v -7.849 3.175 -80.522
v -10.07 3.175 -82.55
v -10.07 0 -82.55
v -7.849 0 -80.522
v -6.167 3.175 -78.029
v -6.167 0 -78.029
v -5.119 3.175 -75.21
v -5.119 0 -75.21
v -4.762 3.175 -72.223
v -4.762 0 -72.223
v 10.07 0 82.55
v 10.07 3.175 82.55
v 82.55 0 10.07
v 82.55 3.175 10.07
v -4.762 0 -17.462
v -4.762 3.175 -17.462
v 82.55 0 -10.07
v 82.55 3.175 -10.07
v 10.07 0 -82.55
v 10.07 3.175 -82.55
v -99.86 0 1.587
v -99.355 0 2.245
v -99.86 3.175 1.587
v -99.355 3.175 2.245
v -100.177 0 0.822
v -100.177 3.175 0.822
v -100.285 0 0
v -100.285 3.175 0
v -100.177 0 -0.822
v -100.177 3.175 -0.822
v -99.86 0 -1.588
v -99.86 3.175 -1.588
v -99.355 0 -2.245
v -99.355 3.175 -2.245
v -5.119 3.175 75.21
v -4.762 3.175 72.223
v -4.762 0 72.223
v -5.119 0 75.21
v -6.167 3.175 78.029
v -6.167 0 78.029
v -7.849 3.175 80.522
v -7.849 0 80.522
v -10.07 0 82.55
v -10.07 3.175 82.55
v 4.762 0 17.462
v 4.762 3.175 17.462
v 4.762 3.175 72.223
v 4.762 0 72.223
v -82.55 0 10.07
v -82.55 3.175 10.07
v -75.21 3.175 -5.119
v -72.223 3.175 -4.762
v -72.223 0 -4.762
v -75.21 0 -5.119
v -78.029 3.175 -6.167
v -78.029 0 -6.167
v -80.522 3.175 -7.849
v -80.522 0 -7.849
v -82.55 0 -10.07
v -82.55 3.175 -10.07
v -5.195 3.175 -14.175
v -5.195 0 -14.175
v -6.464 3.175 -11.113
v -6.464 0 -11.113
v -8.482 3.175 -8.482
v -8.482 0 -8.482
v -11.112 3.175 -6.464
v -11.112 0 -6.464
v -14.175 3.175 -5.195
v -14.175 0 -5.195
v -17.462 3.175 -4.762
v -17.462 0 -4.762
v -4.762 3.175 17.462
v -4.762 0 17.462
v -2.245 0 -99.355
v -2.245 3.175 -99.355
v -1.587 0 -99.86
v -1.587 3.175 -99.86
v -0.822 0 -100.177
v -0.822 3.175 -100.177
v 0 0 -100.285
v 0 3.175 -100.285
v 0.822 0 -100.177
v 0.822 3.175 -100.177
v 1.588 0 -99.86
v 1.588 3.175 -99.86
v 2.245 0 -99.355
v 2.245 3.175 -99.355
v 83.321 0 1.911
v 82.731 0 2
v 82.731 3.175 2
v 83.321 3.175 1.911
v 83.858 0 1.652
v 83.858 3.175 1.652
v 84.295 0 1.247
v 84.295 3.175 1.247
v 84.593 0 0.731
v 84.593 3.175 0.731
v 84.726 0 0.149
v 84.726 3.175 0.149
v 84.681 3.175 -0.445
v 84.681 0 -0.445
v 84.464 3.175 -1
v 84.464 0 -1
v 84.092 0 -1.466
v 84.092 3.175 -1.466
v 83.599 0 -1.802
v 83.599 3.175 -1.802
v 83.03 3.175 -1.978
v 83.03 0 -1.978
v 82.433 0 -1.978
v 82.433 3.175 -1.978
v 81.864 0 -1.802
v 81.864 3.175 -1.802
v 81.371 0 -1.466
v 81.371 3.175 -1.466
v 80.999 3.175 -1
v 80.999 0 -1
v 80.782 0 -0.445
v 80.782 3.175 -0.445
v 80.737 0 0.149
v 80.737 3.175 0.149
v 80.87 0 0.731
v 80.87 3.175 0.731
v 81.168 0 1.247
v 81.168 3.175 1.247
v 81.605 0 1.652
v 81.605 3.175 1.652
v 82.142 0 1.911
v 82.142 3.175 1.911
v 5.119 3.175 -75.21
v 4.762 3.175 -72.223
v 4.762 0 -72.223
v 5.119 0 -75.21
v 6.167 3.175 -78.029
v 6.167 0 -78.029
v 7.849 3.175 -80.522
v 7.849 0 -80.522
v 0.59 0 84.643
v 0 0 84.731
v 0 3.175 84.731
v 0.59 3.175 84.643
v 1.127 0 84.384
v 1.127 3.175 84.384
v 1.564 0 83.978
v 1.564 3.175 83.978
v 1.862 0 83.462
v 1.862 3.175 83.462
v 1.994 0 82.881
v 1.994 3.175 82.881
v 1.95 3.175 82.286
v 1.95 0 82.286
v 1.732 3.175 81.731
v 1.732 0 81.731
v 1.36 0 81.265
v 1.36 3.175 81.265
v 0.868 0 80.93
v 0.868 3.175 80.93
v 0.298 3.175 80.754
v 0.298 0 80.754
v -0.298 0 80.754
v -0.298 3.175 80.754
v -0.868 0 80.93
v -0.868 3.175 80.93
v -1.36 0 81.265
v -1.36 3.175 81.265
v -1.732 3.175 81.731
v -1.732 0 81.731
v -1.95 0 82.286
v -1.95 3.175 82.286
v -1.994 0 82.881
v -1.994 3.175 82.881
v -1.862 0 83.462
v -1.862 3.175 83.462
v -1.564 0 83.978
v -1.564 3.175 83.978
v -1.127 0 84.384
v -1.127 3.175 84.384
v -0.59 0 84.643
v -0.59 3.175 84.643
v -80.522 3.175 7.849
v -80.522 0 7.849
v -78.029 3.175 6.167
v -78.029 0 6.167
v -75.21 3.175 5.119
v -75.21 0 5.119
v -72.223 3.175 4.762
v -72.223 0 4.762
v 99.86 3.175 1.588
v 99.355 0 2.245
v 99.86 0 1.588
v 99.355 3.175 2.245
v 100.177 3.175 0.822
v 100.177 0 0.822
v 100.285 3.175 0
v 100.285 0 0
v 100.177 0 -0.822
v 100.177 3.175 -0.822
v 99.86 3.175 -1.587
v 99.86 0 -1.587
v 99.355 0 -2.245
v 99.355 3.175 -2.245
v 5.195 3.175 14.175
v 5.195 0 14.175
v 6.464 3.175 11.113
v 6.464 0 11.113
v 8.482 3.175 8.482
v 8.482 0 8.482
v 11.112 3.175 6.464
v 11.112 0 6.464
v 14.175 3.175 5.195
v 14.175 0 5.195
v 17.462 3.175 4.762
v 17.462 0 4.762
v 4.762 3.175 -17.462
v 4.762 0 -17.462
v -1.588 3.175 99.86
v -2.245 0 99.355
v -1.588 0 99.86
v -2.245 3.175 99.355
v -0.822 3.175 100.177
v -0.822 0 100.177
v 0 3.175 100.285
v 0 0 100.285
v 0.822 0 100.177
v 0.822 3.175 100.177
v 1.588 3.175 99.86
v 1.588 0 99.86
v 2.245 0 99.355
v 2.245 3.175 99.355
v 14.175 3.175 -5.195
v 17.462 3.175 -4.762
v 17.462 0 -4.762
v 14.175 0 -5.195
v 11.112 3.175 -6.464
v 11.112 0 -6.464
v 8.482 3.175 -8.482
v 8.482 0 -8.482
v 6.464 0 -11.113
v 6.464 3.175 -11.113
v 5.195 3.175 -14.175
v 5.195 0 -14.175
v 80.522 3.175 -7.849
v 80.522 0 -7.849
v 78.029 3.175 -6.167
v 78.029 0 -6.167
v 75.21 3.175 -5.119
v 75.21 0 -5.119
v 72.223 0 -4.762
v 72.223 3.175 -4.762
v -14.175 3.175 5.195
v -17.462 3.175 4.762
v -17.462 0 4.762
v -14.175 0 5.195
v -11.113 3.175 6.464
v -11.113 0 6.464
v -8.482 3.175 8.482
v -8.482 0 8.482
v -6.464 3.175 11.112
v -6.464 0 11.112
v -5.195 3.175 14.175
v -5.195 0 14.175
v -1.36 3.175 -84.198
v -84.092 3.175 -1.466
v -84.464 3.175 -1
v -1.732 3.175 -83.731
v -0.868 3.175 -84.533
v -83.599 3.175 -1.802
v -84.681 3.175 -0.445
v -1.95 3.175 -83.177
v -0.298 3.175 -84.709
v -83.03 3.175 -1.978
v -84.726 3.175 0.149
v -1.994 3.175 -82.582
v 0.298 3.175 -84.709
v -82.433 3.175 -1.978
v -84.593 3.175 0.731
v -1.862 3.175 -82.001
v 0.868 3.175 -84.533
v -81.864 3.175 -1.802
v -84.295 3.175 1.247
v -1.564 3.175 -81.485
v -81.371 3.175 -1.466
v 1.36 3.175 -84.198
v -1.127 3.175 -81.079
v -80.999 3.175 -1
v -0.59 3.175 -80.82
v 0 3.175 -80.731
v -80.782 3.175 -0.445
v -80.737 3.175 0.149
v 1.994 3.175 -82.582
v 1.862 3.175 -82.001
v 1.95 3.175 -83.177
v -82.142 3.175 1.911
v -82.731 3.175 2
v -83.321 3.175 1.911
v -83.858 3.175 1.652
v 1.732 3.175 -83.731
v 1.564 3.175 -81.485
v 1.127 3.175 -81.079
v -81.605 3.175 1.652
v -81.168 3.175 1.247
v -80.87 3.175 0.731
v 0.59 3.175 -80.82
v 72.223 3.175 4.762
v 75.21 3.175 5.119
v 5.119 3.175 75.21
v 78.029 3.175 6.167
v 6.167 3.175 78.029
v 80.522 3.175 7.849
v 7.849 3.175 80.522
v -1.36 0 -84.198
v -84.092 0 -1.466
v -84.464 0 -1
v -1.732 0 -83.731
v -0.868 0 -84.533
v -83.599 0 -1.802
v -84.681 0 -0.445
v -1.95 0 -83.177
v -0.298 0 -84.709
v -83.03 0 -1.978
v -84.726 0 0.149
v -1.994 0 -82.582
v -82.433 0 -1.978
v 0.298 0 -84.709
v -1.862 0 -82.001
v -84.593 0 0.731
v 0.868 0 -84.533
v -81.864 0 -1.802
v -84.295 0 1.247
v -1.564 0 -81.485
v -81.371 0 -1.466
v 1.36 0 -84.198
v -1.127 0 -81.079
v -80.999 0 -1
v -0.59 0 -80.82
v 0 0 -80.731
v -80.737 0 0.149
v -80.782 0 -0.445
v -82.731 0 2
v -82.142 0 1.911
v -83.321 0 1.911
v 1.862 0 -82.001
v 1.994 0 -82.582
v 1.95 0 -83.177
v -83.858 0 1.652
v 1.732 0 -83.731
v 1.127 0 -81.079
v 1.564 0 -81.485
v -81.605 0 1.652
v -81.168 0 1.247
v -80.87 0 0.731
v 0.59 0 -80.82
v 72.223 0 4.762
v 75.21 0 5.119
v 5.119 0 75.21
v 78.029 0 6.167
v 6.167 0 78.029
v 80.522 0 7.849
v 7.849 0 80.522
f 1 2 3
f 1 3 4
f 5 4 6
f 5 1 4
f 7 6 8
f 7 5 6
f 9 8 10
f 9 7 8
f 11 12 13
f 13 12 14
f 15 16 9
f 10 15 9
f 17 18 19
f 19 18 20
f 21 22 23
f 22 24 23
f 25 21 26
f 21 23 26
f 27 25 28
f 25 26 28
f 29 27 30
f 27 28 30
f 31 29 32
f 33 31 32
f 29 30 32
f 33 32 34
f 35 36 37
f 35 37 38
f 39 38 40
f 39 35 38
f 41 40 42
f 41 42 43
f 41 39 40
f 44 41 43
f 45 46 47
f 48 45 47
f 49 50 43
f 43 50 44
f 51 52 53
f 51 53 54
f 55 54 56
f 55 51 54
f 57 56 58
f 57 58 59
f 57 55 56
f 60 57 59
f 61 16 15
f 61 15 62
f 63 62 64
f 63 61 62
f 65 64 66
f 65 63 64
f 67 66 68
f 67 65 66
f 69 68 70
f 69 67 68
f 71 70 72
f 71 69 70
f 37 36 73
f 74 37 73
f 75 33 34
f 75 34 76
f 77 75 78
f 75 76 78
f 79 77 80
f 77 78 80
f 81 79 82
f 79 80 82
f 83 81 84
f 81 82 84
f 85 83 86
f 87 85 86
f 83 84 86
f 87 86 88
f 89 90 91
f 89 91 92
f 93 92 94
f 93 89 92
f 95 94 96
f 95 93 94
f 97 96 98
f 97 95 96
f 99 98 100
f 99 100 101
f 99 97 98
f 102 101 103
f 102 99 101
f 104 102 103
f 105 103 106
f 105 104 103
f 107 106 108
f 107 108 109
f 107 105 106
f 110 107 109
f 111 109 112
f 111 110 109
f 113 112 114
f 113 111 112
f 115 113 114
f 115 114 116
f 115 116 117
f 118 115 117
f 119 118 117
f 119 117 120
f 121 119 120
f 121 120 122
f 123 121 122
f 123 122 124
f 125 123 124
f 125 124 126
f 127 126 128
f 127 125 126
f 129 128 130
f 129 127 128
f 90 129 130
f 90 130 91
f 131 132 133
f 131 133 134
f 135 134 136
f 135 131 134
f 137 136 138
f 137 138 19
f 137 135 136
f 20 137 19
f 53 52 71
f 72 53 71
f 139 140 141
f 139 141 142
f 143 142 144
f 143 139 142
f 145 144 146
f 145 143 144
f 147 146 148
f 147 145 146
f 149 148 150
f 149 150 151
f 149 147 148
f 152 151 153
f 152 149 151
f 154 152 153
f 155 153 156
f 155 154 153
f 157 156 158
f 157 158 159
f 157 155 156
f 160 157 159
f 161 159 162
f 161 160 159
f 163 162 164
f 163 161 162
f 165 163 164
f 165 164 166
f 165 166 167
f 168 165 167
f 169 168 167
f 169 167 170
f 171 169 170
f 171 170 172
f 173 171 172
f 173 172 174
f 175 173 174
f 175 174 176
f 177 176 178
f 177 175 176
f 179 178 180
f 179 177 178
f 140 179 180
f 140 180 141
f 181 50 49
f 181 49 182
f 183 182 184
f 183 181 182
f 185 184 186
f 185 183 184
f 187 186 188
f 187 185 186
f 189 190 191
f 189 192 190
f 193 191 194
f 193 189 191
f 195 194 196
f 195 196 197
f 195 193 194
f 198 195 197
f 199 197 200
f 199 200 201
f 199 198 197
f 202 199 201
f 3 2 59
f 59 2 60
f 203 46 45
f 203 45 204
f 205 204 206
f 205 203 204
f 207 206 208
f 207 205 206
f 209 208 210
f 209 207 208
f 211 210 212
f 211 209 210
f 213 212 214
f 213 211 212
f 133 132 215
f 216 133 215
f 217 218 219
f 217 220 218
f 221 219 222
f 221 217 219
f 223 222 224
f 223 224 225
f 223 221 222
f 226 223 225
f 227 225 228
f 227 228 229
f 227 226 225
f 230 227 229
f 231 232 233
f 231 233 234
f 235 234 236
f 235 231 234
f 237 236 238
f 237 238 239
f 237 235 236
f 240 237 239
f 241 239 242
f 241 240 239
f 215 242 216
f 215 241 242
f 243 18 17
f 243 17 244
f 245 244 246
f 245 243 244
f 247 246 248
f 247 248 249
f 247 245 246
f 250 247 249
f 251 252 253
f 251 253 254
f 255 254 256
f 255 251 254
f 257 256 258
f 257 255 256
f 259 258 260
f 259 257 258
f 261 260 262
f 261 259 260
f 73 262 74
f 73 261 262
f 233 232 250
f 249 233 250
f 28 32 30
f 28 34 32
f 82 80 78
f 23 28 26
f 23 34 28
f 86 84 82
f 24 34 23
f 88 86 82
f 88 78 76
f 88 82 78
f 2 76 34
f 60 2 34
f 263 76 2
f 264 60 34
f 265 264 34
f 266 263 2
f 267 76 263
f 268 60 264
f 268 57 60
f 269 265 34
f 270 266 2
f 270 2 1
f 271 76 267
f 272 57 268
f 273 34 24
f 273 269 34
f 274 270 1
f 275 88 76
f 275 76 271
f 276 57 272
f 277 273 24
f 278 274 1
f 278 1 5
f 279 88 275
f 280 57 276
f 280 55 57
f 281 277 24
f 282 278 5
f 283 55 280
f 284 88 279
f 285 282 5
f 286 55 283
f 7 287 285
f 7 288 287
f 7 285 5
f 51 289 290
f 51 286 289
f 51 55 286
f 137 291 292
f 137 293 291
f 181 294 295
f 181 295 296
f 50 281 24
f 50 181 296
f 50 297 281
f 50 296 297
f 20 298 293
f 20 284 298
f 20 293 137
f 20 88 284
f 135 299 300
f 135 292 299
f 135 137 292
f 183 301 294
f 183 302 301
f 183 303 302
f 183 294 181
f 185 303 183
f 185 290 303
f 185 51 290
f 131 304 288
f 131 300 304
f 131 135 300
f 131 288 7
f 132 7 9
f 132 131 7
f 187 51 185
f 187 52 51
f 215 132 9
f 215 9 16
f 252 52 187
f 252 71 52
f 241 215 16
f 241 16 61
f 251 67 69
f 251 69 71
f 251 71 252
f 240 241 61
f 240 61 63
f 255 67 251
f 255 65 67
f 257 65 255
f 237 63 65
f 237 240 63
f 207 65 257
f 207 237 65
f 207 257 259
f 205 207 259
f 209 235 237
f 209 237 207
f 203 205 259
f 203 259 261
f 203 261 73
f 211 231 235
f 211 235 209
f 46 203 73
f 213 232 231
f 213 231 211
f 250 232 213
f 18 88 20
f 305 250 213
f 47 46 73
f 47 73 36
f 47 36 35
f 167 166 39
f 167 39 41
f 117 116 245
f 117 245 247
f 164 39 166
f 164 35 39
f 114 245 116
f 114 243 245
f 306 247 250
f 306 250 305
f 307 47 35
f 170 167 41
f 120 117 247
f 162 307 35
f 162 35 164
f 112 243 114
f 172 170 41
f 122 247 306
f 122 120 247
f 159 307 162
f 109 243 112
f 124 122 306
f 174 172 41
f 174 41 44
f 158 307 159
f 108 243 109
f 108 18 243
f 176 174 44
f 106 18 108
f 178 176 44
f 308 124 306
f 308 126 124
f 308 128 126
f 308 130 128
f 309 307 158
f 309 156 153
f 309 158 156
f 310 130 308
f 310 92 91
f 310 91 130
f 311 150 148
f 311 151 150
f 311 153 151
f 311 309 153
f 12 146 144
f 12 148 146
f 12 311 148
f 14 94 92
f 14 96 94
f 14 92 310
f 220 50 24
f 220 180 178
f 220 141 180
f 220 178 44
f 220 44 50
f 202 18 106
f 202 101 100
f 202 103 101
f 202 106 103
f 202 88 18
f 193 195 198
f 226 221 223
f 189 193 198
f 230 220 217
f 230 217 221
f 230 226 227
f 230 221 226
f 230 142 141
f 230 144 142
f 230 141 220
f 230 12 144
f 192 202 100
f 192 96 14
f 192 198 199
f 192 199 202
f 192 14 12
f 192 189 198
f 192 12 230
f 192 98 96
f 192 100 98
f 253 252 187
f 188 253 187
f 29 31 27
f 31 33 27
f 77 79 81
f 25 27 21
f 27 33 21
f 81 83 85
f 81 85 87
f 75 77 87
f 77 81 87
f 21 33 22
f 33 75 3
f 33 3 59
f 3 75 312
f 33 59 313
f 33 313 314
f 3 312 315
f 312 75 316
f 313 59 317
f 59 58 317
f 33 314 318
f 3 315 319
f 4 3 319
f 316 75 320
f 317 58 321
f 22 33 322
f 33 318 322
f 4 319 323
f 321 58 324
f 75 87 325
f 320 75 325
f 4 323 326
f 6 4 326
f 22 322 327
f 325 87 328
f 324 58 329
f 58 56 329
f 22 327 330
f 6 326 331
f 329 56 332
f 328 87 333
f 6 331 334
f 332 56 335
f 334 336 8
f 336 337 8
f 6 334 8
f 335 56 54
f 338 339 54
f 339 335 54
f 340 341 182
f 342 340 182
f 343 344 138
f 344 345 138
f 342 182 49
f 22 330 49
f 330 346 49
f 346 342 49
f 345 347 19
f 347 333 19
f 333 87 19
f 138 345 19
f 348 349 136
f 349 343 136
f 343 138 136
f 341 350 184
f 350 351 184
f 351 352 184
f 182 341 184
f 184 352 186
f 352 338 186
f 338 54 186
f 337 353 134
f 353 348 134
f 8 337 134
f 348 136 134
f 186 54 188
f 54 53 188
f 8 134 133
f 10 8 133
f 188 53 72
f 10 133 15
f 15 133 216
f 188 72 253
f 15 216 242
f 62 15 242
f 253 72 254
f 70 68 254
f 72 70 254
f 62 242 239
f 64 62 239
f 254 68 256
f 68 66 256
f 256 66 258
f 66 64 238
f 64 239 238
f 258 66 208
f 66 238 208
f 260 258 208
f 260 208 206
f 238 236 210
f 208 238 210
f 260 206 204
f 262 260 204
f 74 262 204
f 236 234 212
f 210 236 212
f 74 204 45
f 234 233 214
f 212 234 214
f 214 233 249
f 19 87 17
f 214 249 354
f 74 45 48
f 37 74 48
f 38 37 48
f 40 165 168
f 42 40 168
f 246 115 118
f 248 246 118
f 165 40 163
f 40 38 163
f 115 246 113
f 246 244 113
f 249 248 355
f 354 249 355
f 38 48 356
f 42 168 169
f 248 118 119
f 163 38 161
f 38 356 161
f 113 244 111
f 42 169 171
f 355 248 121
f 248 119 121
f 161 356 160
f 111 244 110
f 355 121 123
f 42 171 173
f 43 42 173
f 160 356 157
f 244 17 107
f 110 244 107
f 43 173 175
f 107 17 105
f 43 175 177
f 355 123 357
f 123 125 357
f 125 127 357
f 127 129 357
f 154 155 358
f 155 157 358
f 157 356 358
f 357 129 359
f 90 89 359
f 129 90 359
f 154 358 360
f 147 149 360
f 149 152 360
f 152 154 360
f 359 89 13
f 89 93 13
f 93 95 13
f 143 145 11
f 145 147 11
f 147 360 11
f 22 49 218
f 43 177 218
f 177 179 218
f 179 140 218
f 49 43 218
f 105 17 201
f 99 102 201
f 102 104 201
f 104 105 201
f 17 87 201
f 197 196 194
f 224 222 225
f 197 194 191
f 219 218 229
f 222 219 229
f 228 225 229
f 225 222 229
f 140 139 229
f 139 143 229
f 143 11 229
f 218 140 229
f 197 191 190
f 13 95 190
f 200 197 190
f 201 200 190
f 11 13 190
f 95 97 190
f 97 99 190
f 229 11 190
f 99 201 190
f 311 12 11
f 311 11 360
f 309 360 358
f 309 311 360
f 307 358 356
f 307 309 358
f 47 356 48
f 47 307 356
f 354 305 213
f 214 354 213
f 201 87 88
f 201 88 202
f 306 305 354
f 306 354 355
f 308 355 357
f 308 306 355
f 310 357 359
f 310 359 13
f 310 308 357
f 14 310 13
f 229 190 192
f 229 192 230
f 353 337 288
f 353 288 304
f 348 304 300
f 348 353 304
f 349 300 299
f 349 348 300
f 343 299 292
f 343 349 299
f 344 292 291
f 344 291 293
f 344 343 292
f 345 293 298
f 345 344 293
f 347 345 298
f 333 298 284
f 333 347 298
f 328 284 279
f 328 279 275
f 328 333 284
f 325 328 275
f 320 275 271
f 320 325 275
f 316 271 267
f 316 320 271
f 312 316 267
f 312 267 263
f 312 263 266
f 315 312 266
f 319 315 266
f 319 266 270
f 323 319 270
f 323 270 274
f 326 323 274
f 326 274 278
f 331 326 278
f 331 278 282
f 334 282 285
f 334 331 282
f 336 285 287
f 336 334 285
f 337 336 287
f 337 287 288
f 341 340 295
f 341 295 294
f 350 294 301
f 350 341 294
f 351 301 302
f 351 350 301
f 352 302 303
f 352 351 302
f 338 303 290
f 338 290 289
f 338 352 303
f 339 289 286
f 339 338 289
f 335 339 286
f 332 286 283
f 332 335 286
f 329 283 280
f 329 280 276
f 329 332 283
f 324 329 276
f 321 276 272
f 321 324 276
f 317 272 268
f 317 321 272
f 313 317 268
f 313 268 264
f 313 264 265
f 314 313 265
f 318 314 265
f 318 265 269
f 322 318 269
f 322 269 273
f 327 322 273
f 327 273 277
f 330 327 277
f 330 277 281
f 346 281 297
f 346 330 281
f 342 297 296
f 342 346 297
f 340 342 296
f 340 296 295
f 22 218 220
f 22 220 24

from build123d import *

# Parameters (mm, degrees)
SKETCH1_R           = 2
BOSS_EXTRUDE1_DEPTH = 3.175
CUT_EXTRUDE1_DEPTH  = 144.719172782
FILLET1_R           = 12.7
FILLET2_R           = 3.175


with BuildPart() as part:
    # Sketch1 → Boss-Extrude1 (new body)
    with BuildSketch(Plane(origin=(0, 0, 0), x_dir=(1, 0, 0), z_dir=(0, 1, 0))):
        Polygon((0, -101.6), (-101.6, 0), (0, 101.6), (101.6, 0), align=None)
        with Locations(Location((0, 82.731493173, 0), (0, 0, 270))):
            Circle(SKETCH1_R, mode=Mode.SUBTRACT)
        with Locations(Location((-82.731493173, 0, 0), (0, 0, 270))):
            Circle(SKETCH1_R, mode=Mode.SUBTRACT)
        with Locations(Location((0, -82.731493173, 0), (0, 0, 270))):
            Circle(SKETCH1_R, mode=Mode.SUBTRACT)
        with Locations(Location((82.731493173, 0, 0), (0, 0, 270))):
            Circle(SKETCH1_R, mode=Mode.SUBTRACT)
    extrude(amount=BOSS_EXTRUDE1_DEPTH)

    # Sketch2 → Cut-Extrude1 (cut, through all)
    with BuildSketch(Plane(origin=(0, 3.175, 0), x_dir=(1, 0, 0), z_dir=(0, 1, 0))):
        Polygon((-4.7625, -4.7625), (-82.55, -4.7625), (-82.55, -10.069743879), (-10.069743879, -82.55), (-4.7625, -82.55), align=None)
        Polygon((-4.7625, 4.7625), (-4.7625, 82.55), (-10.069743879, 82.55), (-82.55, 10.069743879), (-82.55, 4.7625), align=None)
        Polygon((4.7625, 82.55), (4.7625, 4.7625), (82.55, 4.7625), (82.55, 10.069743879), (10.069743879, 82.55), align=None)
        Polygon((4.7625, -4.7625), (4.7625, -82.55), (10.069743879, -82.55), (82.55, -10.069743879), (82.55, -4.7625), align=None)
    extrude(amount=-CUT_EXTRUDE1_DEPTH, mode=Mode.SUBTRACT)

    # Fillet1
    # the kernel refuses this fillet: 12.7 mm, written as the material it adds along each edge
    with BuildSketch(Plane(origin=(4.7625, 3.175, 82.55), x_dir=(0, 0, -1), z_dir=(0, -1, 0)), Plane(origin=(-82.55, 3.175, 4.7625), x_dir=(1, 0, 0), z_dir=(0, -1, 0)), Plane(origin=(-4.7625, 3.175, -82.55), x_dir=(0, 0, 1), z_dir=(0, -1, 0))) as fillet1_piece_1:
        with BuildLine():
            CenterArc((10.326526857, 12.7), FILLET1_R, 215.59885924, 54.40114076)
            Line((0, 5.307243879), (-0.206530537, 5.159388757))
            ThreePointArc((-0.206530537, 5.159388757), (-0.254, 2.653621939), (-0.254, 0))
            Line((-0.254, 0), (0, -0.254))
            Line((0, -0.254), (10.326526857, -0.254))
            Line((10.326526857, -0.254), (10.326526857, 0))
        make_face()
    extrude(amount=3.175)
    with BuildSketch(Plane(origin=(4.7625, 3.175, 4.7625), x_dir=(0, 0, 1), z_dir=(0, -1, 0)), Plane(origin=(-4.7625, 3.175, -4.7625), x_dir=(0, 0, -1), z_dir=(0, -1, 0)), Plane(origin=(-4.7625, 3.175, 4.7625), x_dir=(-1, 0, 0), z_dir=(0, -1, 0))) as fillet1_piece_2:
        with BuildLine():
            CenterArc((FILLET1_R, -FILLET1_R), FILLET1_R, 90, 90)
            Line((0, -FILLET1_R), (-FILLET1_R * 0.02, -FILLET1_R))
            Line((-FILLET1_R * 0.02, -FILLET1_R), (-FILLET1_R * 0.02, FILLET1_R * 0.02))
            Line((-FILLET1_R * 0.02, FILLET1_R * 0.02), (FILLET1_R, FILLET1_R * 0.02))
            Line((FILLET1_R, FILLET1_R * 0.02), (FILLET1_R, 0))
        make_face()
    extrude(amount=3.175)
    with BuildSketch(Plane(origin=(82.55, 3.175, 4.7625), x_dir=(-1, 0, 0), z_dir=(0, -1, 0)), Plane(origin=(-4.7625, 3.175, 82.55), x_dir=(0, 0, -1), z_dir=(0, -1, 0)), Plane(origin=(-82.55, 3.175, -4.7625), x_dir=(1, 0, 0), z_dir=(0, -1, 0)), Plane(origin=(4.7625, 3.175, -82.55), x_dir=(0, 0, 1), z_dir=(0, -1, 0))) as fillet1_piece_3:
        with BuildLine():
            CenterArc((10.326526857, -12.7), FILLET1_R, 90, 54.40114076)
            Line((0, -5.307243879), (-0.206530537, -5.159388757))
            ThreePointArc((-0.206530537, -5.159388757), (-0.254, -2.653621939), (-0.254, 0))
            Line((-0.254, 0), (0, 0.254))
            Line((0, 0.254), (10.326526857, 0.254))
            Line((10.326526857, 0.254), (10.326526857, 0))
        make_face()
    extrude(amount=3.175)
    with BuildSketch(Plane(origin=(82.55, 3.175, -4.7625), x_dir=(0, 0, -1), z_dir=(0, -1, 0))) as fillet1_piece_4:
        with BuildLine():
            CenterArc((12.7, -10.326526857), FILLET1_R, 125.59885924, 54.40114076)
            Line((0, -10.326526857), (-0.254, -10.326526857))
            Line((-0.254, -10.326526857), (-0.254, 0))
            Line((-0.254, 0), (0, 0.254))
            ThreePointArc((0, 0.254), (2.653621939, 0.254), (5.159388757, 0.206530537))
            Line((5.159388757, 0.206530537), (5.307243879, 0))
        make_face()
    extrude(amount=3.175)
    with BuildSketch(Plane(origin=(4.7625, 3.175, -4.7625), x_dir=(0, 0, -1), z_dir=(0, -1, 0))) as fillet1_piece_5:
        with BuildLine():
            CenterArc((FILLET1_R, FILLET1_R), FILLET1_R, 180, 90)
            Line((0, FILLET1_R), (-FILLET1_R * 0.02, FILLET1_R))
            Line((-FILLET1_R * 0.02, FILLET1_R), (-FILLET1_R * 0.02, -FILLET1_R * 0.02))
            Line((-FILLET1_R * 0.02, -FILLET1_R * 0.02), (FILLET1_R, -FILLET1_R * 0.02))
            Line((FILLET1_R, -FILLET1_R * 0.02), (FILLET1_R, 0))
        make_face()
    extrude(amount=3.175)

    # Fillet2
    fillet2_edges = [part.edges().sort_by_distance(p)[0] for p in [
        (0, 1.5875, 101.6),
        (-101.6, 1.5875, 0),
        (0, 1.5875, -101.6),
        (101.6, 1.5875, 0),
    ]]
    fillet(fillet2_edges, radius=FILLET2_R)


solid = part.part
